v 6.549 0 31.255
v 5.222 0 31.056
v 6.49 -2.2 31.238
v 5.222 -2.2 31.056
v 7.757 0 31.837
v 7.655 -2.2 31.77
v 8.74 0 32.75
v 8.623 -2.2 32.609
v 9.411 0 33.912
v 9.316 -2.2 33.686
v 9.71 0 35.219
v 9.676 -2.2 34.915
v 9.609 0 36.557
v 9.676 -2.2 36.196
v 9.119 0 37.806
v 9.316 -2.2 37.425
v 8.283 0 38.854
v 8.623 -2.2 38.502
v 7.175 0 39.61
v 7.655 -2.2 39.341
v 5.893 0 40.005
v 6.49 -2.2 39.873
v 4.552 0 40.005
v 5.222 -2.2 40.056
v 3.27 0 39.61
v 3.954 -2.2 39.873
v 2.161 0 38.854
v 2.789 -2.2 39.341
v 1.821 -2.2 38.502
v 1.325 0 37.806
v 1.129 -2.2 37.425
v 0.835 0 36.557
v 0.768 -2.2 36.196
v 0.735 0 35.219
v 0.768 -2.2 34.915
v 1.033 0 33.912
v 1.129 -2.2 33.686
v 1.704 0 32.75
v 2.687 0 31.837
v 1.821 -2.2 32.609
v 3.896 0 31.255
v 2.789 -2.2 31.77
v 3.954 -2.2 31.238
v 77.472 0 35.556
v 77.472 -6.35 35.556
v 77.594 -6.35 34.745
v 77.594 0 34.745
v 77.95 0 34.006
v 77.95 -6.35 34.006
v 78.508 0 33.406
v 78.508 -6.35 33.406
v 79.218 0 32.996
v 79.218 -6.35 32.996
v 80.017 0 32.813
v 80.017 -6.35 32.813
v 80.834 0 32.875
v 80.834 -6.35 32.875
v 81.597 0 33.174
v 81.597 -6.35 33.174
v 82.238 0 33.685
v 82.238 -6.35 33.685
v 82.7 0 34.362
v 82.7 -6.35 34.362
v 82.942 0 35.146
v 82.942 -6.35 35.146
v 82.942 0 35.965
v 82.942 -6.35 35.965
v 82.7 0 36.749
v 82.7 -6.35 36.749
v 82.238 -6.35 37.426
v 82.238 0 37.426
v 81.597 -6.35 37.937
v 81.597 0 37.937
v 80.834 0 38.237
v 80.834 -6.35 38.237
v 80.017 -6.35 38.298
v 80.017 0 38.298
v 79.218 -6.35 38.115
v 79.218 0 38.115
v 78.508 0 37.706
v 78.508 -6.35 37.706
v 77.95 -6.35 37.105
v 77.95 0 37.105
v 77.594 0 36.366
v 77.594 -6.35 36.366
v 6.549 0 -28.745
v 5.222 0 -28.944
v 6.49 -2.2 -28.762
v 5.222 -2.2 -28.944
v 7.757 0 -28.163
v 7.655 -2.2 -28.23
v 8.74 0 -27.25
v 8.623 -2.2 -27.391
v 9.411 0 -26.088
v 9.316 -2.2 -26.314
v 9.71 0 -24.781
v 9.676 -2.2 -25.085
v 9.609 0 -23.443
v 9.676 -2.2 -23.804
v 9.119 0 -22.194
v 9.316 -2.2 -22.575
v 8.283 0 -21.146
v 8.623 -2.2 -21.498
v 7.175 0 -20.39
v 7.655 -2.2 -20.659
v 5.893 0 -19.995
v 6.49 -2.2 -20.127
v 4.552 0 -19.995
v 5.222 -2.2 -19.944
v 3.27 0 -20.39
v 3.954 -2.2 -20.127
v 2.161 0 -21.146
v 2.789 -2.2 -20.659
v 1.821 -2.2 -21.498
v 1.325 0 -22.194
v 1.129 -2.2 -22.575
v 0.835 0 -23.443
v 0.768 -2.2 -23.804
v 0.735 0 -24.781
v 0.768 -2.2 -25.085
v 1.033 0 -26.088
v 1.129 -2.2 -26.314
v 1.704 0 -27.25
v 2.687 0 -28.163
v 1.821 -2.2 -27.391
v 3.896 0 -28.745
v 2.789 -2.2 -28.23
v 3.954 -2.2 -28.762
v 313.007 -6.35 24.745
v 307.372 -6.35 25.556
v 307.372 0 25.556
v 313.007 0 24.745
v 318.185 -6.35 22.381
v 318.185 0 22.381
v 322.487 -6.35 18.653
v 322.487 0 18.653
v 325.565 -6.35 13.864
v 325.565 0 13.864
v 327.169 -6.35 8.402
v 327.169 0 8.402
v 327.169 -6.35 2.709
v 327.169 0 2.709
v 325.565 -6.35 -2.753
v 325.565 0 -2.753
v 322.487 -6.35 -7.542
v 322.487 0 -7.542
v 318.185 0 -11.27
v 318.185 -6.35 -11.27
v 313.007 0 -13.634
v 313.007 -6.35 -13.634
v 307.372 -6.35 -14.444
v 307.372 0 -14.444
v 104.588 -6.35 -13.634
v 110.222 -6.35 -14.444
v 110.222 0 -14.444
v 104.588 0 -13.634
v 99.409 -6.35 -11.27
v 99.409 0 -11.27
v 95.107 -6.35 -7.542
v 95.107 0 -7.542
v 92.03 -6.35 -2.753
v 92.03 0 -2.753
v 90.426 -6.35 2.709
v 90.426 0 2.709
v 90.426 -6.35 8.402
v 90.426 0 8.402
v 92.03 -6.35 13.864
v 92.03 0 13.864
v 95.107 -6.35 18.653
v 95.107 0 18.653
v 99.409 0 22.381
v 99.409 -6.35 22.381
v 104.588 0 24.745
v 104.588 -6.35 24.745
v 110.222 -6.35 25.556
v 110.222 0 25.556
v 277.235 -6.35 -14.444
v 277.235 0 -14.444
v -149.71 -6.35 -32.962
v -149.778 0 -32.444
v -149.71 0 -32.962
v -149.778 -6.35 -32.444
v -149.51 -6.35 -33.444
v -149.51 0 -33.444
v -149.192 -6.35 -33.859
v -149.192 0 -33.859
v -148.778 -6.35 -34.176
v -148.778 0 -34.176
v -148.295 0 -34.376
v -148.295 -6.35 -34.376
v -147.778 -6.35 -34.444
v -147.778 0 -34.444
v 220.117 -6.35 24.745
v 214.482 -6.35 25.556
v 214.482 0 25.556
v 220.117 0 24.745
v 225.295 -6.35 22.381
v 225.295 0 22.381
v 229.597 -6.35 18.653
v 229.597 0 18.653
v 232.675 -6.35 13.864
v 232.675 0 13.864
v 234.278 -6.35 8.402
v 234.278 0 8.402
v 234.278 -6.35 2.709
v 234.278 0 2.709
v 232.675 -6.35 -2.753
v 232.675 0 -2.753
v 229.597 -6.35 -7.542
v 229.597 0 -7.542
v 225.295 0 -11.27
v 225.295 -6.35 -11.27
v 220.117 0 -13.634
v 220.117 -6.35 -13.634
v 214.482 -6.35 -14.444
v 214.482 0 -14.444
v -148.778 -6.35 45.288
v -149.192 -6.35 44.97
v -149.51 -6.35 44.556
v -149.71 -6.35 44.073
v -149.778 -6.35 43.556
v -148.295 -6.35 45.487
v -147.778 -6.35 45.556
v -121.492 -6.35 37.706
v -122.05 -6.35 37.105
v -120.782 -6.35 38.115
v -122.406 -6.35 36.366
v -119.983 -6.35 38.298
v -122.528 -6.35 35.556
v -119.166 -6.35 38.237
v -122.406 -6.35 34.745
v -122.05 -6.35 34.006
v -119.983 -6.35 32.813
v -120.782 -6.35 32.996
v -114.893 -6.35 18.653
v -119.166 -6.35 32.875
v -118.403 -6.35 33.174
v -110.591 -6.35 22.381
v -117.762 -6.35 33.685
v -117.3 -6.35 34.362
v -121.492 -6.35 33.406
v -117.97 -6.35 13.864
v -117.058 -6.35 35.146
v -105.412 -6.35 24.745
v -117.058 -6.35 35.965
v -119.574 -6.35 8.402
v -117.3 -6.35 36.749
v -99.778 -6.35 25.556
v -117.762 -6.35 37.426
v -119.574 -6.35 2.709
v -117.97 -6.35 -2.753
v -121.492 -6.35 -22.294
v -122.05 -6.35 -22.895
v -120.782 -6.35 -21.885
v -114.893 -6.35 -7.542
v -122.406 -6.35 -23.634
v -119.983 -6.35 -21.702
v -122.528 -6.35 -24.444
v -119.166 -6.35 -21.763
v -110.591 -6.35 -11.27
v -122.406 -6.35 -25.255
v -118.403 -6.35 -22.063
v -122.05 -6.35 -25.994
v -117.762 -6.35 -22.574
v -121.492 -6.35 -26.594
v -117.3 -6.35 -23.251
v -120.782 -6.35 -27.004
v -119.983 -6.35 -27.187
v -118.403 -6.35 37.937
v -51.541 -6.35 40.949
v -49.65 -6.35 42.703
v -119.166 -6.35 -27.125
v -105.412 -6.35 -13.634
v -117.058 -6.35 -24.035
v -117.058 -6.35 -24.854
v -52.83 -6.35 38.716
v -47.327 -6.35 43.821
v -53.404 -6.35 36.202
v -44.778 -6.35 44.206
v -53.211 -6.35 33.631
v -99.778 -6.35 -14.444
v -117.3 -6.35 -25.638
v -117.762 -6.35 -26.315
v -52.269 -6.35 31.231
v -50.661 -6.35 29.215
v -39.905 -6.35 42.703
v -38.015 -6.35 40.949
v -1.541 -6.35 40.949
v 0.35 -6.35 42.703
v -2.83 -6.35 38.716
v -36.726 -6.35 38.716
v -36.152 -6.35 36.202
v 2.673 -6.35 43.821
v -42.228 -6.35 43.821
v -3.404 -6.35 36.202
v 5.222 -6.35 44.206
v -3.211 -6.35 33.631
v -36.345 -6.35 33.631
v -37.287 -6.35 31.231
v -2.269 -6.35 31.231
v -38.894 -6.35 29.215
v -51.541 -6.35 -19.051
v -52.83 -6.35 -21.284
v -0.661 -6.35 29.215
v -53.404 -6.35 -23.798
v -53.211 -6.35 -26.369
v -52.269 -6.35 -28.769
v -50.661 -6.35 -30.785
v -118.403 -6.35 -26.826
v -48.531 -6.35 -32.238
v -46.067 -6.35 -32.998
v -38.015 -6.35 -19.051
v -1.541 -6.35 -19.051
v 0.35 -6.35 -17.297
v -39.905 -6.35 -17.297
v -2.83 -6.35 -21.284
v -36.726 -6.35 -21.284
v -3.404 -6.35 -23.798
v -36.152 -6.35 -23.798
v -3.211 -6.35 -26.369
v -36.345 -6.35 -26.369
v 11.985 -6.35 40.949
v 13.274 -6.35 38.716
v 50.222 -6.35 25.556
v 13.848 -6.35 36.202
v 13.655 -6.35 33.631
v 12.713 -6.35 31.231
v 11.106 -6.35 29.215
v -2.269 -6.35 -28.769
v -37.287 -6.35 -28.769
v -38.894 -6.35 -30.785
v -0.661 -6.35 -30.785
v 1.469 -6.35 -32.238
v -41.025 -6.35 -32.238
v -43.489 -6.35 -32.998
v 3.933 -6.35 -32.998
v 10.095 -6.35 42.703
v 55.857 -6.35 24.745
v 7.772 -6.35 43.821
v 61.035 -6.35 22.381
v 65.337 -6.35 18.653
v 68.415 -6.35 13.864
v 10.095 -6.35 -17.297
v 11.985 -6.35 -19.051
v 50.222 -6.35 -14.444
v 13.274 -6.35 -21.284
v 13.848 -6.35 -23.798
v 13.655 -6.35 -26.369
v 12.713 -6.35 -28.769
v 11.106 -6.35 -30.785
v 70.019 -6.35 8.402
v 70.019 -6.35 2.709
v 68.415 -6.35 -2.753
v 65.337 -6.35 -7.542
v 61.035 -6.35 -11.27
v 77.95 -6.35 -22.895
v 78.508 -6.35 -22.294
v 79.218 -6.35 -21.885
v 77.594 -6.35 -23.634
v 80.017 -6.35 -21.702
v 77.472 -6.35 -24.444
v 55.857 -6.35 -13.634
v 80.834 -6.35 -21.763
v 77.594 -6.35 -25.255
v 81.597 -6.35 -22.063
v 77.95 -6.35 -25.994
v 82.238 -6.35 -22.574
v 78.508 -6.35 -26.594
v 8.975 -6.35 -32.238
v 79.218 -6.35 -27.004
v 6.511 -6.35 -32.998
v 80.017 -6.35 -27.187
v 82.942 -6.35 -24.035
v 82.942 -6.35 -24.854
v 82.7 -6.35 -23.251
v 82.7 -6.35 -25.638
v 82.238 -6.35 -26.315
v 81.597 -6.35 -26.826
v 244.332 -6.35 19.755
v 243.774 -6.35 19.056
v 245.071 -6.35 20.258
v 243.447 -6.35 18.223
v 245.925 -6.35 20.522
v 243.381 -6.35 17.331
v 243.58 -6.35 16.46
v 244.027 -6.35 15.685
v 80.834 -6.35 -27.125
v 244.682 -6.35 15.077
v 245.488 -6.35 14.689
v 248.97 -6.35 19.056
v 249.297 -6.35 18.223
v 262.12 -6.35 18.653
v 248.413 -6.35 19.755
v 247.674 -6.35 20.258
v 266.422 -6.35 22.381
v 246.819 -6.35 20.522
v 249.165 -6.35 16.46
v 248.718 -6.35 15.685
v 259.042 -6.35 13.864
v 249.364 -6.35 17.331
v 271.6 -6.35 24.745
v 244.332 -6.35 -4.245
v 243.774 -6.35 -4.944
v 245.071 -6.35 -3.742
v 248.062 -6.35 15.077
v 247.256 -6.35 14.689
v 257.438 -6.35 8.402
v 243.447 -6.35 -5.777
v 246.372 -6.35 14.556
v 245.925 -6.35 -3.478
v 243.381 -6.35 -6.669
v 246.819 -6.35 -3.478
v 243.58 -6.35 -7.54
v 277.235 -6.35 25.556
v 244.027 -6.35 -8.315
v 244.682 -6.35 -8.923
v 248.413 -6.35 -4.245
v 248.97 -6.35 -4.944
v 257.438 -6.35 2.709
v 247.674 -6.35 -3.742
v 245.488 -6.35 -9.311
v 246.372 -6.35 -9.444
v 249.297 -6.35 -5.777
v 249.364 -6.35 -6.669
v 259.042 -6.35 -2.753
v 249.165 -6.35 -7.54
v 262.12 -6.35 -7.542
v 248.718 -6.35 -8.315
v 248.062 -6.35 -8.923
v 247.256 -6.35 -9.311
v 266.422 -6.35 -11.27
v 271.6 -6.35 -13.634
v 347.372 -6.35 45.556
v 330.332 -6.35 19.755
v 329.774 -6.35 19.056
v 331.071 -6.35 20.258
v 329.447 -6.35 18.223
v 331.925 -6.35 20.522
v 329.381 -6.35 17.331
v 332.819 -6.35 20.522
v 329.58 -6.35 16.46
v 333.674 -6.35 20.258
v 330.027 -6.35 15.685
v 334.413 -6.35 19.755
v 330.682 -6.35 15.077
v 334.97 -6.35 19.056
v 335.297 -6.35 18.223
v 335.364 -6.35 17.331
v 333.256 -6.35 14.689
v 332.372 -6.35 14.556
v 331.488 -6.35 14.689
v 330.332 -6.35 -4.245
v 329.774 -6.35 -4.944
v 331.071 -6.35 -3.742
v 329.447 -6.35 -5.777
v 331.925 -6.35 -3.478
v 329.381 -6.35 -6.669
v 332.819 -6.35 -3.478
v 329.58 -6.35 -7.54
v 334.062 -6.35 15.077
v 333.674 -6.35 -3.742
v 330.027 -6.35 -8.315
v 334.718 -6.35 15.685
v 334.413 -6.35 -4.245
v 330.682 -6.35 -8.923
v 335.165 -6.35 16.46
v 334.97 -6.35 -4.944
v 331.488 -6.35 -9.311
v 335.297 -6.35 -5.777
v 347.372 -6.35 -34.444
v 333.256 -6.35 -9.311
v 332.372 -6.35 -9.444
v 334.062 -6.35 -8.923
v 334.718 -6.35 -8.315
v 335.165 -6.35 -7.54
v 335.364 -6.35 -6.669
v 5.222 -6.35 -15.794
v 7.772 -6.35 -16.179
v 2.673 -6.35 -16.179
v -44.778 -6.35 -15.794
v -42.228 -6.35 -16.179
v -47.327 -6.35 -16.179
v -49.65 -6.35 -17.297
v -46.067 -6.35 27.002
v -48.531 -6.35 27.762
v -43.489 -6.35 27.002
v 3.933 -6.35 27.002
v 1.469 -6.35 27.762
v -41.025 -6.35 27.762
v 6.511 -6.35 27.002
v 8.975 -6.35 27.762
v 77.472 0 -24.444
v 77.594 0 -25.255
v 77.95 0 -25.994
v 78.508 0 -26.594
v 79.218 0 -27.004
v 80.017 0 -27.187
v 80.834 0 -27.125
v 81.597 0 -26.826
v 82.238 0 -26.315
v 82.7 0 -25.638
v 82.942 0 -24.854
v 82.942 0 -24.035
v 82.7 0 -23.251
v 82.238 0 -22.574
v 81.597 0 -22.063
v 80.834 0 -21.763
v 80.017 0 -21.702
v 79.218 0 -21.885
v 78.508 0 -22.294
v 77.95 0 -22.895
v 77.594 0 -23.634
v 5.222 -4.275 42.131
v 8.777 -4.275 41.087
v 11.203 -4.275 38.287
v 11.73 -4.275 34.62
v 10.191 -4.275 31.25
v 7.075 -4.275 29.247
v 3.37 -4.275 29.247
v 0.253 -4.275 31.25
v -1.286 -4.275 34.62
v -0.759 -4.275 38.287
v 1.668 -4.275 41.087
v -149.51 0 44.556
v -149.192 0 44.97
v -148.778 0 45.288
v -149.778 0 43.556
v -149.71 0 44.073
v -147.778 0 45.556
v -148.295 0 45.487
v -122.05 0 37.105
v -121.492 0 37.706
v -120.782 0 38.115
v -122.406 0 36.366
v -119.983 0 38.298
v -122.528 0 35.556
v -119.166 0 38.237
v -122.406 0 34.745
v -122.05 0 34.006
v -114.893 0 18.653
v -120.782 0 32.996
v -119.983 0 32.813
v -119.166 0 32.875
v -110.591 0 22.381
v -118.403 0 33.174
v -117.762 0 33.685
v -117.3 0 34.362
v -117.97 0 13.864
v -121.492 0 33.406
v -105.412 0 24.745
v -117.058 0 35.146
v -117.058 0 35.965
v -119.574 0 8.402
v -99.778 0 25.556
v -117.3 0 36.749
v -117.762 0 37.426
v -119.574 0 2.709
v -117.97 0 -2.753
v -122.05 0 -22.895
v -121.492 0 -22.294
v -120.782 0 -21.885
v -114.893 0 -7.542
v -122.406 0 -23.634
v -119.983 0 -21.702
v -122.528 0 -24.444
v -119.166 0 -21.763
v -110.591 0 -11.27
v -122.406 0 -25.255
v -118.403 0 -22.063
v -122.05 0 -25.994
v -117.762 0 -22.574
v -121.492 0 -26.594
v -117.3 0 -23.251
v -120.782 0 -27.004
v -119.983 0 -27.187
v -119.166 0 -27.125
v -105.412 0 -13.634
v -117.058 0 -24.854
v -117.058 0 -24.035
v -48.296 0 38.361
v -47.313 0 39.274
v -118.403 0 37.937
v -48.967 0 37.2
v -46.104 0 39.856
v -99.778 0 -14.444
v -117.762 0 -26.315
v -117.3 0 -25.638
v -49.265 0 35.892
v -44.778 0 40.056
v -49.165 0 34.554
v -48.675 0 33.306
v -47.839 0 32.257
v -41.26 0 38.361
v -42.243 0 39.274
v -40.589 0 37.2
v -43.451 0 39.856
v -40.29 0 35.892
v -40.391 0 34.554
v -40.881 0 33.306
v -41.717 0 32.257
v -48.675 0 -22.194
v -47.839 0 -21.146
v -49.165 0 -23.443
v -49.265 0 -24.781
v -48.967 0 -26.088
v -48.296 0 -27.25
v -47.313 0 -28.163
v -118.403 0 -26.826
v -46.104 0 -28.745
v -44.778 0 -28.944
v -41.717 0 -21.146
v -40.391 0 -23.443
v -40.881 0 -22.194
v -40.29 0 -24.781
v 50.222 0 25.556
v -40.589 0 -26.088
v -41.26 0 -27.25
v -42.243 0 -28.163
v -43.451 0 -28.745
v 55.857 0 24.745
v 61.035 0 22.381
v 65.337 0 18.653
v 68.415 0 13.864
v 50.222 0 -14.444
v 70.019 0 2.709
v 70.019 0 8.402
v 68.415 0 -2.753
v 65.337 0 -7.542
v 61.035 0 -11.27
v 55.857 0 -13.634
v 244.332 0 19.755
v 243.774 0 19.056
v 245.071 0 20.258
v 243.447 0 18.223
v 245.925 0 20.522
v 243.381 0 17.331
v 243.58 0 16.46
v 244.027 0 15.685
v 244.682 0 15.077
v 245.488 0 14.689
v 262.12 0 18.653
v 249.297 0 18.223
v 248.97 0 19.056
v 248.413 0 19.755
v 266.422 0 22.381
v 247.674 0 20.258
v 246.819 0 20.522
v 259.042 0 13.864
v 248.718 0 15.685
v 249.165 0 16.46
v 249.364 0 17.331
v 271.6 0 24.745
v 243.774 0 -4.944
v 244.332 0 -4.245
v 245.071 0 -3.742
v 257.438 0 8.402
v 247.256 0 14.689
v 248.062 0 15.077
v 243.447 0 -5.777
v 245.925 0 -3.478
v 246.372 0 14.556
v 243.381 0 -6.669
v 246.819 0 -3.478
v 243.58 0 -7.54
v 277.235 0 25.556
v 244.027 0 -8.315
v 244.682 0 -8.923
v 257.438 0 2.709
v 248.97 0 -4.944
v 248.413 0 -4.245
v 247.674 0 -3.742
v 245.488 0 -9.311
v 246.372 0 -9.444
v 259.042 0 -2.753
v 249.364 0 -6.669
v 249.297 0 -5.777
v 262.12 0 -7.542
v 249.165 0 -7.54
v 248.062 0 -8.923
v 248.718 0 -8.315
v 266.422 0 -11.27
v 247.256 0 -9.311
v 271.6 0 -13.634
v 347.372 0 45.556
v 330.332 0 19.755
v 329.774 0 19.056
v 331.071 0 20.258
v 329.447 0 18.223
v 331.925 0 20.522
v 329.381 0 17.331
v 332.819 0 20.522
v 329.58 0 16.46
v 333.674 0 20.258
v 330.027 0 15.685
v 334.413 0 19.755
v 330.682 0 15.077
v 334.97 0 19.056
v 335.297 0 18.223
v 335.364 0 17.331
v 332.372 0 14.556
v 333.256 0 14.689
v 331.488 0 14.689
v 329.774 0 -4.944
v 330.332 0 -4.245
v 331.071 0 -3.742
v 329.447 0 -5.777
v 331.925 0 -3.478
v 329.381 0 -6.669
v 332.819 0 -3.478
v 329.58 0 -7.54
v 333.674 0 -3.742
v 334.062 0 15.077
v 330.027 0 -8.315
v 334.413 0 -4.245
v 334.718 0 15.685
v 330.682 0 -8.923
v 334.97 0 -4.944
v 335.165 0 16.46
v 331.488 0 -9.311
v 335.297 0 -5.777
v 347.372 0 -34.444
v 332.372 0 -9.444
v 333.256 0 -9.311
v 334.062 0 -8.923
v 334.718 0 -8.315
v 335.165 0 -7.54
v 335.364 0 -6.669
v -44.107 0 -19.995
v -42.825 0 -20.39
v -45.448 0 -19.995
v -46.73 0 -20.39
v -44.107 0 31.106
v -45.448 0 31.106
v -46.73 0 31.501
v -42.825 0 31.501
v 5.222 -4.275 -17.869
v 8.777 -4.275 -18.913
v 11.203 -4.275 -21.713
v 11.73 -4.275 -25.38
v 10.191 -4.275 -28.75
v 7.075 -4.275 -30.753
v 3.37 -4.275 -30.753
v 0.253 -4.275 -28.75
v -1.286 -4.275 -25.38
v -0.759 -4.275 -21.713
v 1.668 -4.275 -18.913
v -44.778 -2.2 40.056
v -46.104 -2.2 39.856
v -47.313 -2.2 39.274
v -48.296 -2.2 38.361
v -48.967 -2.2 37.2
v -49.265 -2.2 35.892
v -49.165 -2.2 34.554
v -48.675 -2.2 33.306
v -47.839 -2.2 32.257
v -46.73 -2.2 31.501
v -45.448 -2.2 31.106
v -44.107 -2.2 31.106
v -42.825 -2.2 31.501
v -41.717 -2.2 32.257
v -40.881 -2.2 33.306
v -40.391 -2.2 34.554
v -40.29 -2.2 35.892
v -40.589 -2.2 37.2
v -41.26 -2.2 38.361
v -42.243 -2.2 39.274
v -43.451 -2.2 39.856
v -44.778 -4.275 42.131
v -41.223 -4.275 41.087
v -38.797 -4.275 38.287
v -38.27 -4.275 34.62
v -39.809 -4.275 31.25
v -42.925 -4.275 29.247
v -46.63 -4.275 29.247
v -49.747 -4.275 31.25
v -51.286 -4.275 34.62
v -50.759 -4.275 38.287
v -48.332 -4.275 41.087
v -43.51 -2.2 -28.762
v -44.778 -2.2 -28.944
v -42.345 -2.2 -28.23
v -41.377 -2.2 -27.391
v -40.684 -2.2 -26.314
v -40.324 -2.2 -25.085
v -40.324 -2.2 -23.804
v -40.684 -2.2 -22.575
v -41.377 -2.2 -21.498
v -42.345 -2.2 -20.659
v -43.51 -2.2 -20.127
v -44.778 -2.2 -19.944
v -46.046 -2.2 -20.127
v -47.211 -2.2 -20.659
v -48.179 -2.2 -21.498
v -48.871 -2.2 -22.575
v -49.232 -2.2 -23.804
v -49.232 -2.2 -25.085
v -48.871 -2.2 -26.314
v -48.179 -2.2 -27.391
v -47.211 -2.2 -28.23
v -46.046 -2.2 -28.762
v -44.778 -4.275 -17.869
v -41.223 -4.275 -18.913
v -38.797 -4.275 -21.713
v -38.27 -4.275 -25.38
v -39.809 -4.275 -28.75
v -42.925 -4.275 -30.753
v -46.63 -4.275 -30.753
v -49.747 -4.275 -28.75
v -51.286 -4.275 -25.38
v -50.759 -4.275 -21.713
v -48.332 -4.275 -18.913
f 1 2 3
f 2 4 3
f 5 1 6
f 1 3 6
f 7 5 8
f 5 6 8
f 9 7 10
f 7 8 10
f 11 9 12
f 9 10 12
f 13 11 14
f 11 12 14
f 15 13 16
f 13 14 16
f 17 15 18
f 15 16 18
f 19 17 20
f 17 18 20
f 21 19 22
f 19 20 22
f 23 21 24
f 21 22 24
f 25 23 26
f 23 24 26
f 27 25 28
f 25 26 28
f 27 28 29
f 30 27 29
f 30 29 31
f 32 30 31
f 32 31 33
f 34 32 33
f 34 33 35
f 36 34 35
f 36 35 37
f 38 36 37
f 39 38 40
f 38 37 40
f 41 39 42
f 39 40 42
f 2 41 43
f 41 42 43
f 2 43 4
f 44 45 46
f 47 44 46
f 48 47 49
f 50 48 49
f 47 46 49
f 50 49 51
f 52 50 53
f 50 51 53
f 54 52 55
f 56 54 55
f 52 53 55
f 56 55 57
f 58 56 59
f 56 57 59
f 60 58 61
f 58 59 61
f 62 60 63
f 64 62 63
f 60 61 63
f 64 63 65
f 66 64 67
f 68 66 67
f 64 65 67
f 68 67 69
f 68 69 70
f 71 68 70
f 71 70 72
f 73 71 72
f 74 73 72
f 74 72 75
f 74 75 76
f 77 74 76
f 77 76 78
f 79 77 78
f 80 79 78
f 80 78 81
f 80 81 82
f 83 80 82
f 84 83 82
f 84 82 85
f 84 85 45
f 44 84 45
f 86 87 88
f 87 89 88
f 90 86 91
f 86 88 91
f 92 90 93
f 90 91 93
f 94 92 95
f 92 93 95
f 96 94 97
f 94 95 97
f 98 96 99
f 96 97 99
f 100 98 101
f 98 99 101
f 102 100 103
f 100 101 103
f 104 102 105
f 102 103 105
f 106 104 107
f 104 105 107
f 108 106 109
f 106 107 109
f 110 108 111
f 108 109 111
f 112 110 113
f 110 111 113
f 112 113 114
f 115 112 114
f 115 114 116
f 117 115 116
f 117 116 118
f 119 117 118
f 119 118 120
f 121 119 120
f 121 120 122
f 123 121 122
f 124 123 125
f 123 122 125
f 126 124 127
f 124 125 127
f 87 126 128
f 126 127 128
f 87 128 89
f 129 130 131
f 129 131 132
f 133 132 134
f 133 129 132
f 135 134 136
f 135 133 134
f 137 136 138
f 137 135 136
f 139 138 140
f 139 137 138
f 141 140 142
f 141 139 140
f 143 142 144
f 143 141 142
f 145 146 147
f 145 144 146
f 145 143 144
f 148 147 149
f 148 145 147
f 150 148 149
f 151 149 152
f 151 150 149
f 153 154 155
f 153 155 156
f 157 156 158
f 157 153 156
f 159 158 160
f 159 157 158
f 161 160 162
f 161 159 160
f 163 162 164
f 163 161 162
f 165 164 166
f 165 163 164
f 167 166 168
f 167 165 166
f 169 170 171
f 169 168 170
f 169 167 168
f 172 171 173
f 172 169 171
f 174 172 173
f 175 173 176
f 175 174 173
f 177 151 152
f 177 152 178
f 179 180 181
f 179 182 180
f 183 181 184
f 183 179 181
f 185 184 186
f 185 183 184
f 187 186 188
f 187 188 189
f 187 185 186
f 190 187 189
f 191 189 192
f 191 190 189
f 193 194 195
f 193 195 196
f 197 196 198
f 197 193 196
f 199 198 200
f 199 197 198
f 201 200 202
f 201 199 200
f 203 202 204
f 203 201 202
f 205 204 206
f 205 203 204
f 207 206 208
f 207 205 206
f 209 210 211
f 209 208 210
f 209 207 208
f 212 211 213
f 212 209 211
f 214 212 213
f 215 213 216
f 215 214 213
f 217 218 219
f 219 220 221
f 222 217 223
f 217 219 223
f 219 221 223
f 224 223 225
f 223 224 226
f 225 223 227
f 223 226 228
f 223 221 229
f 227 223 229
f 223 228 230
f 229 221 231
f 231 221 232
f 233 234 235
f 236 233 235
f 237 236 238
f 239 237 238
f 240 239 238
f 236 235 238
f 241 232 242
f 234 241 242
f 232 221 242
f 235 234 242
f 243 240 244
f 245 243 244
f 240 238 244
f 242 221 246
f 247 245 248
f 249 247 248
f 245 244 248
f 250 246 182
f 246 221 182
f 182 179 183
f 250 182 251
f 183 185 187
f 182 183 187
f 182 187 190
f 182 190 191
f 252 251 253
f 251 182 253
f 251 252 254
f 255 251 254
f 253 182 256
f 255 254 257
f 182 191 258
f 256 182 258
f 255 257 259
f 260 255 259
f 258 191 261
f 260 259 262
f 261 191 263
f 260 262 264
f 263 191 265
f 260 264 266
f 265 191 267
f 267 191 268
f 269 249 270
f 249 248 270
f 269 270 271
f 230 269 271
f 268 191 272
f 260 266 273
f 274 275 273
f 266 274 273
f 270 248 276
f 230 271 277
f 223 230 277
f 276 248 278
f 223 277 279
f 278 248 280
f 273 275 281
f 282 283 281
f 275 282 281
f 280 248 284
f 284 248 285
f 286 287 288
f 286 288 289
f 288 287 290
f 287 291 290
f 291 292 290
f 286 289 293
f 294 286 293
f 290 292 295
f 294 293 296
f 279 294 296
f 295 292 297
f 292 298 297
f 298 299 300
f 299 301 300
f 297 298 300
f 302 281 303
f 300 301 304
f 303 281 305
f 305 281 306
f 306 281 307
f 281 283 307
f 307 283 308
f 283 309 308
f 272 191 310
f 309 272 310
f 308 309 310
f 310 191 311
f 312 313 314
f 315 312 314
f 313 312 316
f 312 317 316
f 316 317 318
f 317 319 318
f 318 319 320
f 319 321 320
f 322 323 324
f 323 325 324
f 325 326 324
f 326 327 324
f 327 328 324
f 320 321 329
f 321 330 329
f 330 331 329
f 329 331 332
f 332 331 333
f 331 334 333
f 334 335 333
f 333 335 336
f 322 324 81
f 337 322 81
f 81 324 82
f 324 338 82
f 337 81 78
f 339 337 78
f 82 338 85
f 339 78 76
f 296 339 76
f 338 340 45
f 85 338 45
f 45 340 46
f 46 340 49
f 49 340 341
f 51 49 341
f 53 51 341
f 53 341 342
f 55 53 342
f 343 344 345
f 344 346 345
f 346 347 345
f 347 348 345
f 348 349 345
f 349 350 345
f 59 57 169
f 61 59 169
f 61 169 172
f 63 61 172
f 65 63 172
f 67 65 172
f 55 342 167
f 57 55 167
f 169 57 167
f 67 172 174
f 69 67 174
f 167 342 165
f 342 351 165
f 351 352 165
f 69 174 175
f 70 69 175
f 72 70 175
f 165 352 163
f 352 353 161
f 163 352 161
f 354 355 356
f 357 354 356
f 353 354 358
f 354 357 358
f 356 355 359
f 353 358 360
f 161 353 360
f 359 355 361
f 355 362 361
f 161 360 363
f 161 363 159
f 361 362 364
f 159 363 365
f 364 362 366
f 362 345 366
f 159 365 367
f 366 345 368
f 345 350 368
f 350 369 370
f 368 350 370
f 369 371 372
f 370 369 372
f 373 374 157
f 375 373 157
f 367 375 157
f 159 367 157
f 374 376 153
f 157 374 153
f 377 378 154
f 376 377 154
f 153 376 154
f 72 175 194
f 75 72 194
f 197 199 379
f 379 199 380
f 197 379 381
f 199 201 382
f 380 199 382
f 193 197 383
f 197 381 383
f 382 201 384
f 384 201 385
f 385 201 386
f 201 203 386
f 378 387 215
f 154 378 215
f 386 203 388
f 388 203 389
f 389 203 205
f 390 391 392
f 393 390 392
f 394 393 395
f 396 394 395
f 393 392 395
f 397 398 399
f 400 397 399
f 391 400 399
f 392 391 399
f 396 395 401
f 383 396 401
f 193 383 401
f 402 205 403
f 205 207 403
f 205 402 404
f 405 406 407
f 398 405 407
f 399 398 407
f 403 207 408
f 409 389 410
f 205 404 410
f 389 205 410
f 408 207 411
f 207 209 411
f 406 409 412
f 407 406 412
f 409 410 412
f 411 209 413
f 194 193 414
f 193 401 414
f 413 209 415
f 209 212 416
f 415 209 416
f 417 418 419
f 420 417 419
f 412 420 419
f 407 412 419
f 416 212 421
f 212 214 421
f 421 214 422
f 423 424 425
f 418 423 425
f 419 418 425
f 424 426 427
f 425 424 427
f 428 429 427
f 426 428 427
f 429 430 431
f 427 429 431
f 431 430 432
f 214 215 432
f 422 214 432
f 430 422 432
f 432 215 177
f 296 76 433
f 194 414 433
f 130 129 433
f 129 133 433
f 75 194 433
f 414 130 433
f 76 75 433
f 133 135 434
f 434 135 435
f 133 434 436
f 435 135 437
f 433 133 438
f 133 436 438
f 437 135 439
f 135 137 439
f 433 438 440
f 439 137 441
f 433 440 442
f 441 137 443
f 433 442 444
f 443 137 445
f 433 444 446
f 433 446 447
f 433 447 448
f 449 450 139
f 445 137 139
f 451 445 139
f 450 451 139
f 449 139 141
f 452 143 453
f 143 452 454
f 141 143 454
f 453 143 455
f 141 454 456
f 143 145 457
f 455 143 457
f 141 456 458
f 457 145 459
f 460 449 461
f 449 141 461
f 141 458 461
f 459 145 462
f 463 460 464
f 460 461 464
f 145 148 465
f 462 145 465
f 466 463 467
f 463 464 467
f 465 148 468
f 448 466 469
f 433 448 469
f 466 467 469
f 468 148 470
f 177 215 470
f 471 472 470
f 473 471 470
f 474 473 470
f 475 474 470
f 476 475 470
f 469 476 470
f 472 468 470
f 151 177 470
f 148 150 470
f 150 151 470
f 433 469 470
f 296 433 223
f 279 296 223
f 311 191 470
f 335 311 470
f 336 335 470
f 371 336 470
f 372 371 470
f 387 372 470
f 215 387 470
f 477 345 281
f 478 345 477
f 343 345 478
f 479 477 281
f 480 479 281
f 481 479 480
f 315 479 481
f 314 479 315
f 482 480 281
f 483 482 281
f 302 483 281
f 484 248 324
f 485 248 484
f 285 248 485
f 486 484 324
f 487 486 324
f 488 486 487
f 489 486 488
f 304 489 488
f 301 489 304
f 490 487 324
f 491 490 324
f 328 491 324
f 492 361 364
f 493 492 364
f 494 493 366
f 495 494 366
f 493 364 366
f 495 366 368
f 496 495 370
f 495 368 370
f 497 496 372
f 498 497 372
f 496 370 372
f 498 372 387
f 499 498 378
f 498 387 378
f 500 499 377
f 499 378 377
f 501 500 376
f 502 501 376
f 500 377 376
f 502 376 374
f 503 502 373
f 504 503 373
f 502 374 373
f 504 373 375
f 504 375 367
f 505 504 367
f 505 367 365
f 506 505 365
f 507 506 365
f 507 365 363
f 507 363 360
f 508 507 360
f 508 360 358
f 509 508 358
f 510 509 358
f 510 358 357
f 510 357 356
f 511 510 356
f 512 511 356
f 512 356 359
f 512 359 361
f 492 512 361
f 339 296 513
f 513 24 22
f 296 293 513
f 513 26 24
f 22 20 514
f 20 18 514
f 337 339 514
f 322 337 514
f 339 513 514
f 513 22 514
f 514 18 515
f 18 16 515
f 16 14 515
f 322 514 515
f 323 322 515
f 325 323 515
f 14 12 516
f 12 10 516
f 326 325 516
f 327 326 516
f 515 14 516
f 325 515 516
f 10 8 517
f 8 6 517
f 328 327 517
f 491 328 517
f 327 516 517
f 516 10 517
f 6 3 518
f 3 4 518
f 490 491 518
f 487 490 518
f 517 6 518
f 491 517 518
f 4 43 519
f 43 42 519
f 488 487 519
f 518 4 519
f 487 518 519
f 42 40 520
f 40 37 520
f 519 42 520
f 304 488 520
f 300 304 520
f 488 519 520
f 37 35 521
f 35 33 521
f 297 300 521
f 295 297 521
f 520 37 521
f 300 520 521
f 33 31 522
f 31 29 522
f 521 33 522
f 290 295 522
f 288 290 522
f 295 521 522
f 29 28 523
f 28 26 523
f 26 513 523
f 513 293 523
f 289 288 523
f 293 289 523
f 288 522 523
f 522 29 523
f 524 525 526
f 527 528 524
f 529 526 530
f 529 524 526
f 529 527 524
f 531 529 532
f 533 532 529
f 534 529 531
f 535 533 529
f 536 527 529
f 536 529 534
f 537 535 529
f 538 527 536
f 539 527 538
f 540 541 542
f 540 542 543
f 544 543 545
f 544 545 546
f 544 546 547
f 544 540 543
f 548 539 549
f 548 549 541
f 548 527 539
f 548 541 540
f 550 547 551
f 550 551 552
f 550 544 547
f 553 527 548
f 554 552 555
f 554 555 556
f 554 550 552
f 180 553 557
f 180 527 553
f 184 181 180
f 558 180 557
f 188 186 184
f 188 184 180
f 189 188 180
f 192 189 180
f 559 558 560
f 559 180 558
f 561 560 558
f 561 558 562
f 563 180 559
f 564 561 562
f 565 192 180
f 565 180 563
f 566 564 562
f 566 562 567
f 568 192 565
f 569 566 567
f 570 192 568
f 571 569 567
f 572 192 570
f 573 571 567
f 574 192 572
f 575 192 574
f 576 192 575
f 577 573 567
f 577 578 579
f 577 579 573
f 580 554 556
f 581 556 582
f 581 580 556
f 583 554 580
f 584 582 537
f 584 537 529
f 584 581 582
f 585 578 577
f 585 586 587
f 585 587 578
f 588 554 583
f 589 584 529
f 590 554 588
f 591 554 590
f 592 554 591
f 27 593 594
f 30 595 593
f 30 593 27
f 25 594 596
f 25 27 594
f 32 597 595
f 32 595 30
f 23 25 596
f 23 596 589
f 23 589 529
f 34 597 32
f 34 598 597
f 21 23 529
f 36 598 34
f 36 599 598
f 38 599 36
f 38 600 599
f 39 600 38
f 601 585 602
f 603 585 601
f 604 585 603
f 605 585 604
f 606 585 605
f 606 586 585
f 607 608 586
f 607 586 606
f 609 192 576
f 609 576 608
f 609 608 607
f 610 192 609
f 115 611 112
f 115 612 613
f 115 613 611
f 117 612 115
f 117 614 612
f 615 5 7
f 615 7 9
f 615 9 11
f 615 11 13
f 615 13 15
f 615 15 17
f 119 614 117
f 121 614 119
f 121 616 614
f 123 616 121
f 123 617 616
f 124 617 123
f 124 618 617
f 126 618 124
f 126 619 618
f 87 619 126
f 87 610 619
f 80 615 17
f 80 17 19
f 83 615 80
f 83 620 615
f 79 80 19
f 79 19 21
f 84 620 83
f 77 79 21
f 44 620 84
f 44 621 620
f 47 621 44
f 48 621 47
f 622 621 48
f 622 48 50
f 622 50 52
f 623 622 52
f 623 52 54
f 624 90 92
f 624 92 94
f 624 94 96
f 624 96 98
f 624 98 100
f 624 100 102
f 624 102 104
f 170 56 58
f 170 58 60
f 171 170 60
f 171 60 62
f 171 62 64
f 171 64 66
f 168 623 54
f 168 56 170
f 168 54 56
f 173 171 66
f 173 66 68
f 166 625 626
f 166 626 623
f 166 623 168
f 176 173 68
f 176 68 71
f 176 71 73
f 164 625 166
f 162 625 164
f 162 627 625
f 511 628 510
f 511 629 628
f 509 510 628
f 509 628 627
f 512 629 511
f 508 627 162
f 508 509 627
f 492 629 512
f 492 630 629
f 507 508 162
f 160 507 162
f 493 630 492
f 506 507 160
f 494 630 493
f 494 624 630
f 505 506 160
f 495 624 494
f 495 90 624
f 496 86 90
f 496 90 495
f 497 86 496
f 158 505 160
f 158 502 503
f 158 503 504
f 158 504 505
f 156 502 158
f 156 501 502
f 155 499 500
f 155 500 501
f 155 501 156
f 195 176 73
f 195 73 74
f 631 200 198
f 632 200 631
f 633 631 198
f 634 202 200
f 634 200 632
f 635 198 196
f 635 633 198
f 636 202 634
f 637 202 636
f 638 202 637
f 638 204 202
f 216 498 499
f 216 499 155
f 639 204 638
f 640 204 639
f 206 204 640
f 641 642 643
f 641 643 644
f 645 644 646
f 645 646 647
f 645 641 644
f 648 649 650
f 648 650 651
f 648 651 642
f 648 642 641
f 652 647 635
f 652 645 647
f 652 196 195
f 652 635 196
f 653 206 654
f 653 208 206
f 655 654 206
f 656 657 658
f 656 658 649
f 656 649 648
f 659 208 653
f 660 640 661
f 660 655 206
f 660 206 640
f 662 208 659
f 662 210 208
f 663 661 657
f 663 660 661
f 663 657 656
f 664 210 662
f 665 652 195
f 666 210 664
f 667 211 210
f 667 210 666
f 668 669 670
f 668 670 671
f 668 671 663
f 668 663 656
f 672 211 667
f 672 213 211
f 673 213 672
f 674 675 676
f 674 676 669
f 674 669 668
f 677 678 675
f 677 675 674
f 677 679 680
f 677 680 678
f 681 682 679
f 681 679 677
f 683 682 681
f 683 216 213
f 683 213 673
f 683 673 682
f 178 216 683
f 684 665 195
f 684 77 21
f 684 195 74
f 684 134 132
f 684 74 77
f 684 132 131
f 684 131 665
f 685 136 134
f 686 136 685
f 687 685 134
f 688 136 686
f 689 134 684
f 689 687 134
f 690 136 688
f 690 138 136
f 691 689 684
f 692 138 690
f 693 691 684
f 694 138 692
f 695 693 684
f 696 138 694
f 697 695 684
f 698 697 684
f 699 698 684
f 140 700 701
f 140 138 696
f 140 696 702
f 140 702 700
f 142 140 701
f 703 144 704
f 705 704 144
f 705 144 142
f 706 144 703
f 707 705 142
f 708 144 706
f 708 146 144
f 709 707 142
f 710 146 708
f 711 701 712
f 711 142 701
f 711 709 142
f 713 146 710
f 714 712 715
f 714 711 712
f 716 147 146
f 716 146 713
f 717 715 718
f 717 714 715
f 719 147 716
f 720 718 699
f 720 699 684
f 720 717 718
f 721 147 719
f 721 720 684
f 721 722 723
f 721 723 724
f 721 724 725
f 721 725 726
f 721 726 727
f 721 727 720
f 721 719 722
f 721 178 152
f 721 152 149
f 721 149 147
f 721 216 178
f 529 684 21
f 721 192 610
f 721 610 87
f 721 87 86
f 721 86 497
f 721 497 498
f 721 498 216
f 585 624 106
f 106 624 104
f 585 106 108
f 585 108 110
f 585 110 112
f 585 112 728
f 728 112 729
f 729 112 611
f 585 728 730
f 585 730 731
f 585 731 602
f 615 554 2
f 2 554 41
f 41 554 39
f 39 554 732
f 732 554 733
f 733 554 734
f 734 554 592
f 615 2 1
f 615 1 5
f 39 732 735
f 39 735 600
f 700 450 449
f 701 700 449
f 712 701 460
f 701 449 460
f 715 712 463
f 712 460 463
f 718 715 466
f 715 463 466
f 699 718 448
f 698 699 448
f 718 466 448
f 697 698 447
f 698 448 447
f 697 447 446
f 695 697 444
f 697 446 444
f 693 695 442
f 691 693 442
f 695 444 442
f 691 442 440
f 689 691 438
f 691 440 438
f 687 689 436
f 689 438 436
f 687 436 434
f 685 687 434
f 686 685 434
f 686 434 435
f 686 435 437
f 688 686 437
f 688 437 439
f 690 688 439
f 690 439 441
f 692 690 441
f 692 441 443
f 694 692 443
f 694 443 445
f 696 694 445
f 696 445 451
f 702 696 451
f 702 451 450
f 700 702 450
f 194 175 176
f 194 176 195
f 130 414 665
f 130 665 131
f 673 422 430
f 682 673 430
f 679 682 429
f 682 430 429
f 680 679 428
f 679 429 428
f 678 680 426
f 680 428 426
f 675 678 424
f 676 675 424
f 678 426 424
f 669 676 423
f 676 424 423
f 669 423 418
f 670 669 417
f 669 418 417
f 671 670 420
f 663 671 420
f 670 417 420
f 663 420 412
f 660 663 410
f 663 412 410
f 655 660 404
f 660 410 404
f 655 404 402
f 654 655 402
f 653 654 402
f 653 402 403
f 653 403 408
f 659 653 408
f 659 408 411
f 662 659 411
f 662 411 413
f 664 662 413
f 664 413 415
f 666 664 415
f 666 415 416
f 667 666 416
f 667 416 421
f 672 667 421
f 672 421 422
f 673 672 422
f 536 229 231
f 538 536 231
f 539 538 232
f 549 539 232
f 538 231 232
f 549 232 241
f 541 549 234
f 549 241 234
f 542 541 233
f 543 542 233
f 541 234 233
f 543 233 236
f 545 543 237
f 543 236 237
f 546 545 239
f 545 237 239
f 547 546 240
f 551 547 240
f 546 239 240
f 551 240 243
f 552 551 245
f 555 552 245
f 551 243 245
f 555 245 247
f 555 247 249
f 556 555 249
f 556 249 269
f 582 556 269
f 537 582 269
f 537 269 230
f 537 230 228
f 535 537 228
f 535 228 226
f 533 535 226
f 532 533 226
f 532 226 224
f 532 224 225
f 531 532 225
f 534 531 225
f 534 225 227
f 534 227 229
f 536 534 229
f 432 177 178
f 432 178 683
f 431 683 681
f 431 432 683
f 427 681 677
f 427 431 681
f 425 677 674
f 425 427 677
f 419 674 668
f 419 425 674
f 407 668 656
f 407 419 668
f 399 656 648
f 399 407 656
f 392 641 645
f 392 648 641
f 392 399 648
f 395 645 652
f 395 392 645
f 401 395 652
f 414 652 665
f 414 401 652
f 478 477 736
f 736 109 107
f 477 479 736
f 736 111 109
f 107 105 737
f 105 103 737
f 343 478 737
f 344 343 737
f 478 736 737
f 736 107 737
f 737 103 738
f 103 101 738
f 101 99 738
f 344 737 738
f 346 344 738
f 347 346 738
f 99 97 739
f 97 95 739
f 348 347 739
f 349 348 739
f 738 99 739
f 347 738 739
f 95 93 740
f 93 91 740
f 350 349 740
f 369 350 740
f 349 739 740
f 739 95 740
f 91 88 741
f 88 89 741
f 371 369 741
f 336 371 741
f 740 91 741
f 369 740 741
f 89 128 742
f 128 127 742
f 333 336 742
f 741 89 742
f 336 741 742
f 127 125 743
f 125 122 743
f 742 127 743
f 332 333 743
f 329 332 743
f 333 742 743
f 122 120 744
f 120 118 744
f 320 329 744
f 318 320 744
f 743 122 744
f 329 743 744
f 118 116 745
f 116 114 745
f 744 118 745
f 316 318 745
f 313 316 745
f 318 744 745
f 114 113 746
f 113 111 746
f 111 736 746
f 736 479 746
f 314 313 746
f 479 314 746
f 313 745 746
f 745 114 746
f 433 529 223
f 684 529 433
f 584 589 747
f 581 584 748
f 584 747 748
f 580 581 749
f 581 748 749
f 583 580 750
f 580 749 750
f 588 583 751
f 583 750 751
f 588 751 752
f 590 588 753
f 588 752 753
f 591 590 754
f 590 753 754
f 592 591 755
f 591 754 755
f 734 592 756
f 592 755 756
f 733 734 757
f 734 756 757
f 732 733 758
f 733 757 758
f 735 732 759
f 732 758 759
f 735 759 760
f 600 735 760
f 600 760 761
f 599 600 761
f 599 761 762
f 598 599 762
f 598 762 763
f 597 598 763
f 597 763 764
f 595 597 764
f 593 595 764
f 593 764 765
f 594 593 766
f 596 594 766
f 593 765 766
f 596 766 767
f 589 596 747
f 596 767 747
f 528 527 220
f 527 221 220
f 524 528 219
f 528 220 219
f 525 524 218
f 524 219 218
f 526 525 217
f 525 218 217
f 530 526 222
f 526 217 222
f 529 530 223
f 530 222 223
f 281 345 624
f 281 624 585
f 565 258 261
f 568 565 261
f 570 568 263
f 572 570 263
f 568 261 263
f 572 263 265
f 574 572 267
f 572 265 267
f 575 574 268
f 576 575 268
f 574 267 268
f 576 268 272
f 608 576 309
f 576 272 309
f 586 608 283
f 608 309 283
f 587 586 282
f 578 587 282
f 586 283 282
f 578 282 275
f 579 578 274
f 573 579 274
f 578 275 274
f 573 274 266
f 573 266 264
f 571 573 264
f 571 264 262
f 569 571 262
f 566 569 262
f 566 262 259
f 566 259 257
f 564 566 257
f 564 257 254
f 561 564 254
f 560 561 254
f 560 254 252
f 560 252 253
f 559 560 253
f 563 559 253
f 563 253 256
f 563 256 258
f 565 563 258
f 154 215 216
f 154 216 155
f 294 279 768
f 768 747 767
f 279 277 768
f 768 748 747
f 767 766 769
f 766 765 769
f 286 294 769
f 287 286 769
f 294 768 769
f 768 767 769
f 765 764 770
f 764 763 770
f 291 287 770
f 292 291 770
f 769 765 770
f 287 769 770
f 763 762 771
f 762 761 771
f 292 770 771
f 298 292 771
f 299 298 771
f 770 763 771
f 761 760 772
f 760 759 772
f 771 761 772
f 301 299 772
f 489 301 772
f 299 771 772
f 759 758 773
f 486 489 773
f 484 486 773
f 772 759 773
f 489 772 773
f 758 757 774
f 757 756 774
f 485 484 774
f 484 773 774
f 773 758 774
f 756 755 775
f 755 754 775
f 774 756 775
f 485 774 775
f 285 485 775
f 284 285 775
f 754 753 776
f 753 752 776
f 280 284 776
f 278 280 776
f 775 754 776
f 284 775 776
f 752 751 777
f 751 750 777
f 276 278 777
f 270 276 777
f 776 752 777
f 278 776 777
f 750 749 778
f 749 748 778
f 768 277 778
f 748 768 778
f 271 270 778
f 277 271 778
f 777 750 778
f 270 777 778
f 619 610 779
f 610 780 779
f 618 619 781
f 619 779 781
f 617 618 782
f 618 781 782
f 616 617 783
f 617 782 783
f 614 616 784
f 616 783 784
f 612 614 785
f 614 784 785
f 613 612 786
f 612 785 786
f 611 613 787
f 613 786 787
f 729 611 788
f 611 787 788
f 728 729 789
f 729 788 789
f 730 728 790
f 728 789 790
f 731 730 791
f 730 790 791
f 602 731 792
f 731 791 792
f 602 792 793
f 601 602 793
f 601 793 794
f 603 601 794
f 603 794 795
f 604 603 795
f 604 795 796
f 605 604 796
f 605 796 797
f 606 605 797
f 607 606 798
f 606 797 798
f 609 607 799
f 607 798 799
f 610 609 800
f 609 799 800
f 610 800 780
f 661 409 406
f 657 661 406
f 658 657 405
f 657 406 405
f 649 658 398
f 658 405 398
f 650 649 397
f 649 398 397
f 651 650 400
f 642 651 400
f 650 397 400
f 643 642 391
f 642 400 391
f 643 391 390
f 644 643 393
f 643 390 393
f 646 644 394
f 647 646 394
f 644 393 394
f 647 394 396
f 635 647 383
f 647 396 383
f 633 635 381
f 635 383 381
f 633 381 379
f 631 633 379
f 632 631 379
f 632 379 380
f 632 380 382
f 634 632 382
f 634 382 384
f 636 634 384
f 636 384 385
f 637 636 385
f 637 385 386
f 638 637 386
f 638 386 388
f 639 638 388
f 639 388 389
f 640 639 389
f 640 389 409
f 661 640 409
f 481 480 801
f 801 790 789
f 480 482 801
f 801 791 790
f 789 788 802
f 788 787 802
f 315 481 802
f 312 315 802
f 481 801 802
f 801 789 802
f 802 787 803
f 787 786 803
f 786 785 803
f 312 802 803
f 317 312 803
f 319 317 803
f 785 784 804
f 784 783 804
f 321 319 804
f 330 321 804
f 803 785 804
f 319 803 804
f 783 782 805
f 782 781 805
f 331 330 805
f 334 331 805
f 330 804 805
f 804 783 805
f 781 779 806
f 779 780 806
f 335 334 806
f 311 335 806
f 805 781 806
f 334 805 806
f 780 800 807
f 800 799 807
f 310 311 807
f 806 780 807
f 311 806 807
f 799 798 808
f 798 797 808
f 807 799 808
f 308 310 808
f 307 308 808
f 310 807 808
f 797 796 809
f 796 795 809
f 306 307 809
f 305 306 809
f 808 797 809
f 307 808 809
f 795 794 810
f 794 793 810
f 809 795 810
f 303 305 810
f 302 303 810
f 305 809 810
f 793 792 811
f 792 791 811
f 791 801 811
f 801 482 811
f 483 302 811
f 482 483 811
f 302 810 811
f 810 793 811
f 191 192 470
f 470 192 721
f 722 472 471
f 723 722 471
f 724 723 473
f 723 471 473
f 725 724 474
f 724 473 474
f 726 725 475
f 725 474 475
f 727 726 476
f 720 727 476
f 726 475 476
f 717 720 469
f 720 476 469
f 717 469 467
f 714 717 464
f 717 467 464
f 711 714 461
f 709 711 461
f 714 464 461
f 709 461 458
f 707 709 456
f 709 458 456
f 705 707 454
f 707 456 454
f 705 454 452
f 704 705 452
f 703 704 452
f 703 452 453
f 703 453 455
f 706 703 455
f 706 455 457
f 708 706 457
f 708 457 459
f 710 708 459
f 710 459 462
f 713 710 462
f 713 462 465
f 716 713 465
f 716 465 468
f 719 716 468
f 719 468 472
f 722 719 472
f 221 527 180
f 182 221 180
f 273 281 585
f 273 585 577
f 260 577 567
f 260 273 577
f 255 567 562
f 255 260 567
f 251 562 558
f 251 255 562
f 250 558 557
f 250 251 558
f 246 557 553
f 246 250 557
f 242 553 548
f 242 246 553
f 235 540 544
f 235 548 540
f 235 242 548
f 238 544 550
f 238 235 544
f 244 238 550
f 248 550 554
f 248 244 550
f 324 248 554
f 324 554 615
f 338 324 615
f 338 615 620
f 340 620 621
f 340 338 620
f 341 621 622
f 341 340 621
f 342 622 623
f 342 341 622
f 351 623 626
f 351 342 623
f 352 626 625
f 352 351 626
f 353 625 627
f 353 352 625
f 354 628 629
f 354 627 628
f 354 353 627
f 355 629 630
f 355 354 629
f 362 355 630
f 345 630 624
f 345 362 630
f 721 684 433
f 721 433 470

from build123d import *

# Parameters (mm, degrees)
CROQUIS1_W                                      = 497.15
CROQUIS1_H                                      = 80
BRIDA_BASE1_DEPTH                               = 6.35
REDONDEO1_R                                     = 2
TALADRO_DE_MARGEN_PARA_M51_D                    = 5.5
CORTAR_EXTRUIR1_DEPTH                           = 10
CROQUIS10_R                                     = 3
CORTAR_EXTRUIR2_DEPTH                           = 10
SKETCH1_R                                       = 4.5
CUT_EXTRUDE1_DEPTH                              = 6.35
CSK_FOR_M8_OVAL_HEAD_MACHINE_SCREW1_D           = 9
CSK_FOR_M8_OVAL_HEAD_MACHINE_SCREW1_DEPTH       = 6.349
CSK_FOR_M8_OVAL_HEAD_MACHINE_SCREW1_CSINK_D     = 17.3
CSK_FOR_M8_OVAL_HEAD_MACHINE_SCREW1_CSINK_ANGLE = 90
CSK_FOR_M8_OVAL_HEAD_MACHINE_SCREW1_TIP         = 2.703872786


# Sheet-metal steps are written as plain solids
with BuildPart() as part:
    # Croquis1 → Brida base1 (new body)
    with BuildSketch(Plane(origin=(0, 0, 0), x_dir=(1, 0, 0), z_dir=(0, 1, 0))):
        with Locations((98.797222222, -5.555555556)):
            Rectangle(CROQUIS1_W, CROQUIS1_H)
    extrude(amount=-BRIDA_BASE1_DEPTH)

    # Redondeo1
    redondeo1_edges = [part.edges().sort_by_distance(p)[0] for p in [
        (-149.777777778, -3.175, -34.444444444),
        (-149.777777778, -3.175, 45.555555556),
    ]]
    fillet(redondeo1_edges, radius=REDONDEO1_R)

    # Taladro de margen para M51 (through all)
    with Locations(Plane(origin=(0, 0, 0), x_dir=(1, 0, 0), z_dir=(0, 1, 0))):
        with Locations((-119.777777778, 24.444444444), (-119.777777778, -35.555555556), (80.222222222, -35.555555556), (80.222222222, 24.444444444)):
            Hole(TALADRO_DE_MARGEN_PARA_M51_D / 2)

    # Croquis9 → Cortar-Extruir1 (cut)
    with BuildSketch(Plane(origin=(0, -6.35, 0), x_dir=(-1, 0, 0), z_dir=(0, -1, 0))):
        with BuildLine():
            Line((-307.372222222, 14.444444444), (-277.234752083, 14.444444444))
            ThreePointArc((-277.234752083, 14.444444444), (-257.234752083, -5.555555556), (-277.234752083, -25.555555556))
            Line((-277.234752083, -25.555555556), (-307.372222222, -25.555555556))
            ThreePointArc((-307.372222222, -25.555555556), (-327.372222222, -5.555555556), (-307.372222222, 14.444444444))
        make_face()
        with BuildLine():
            Line((-50.222222222, 14.444444444), (99.777777778, 14.444444444))
            ThreePointArc((99.777777778, 14.444444444), (119.777777778, -5.555555556), (99.777777778, -25.555555556))
            Line((99.777777778, -25.555555556), (-50.222222222, -25.555555556))
            ThreePointArc((-50.222222222, -25.555555556), (-70.222222222, -5.555555556), (-50.222222222, 14.444444444))
        make_face()
        with BuildLine():
            Line((-214.481912447, 14.444444444), (-110.222222222, 14.444444444))
            ThreePointArc((-110.222222222, 14.444444444), (-90.222222222, -5.555555556), (-110.222222222, -25.555555556))
            Line((-110.222222222, -25.555555556), (-214.481912447, -25.555555556))
            ThreePointArc((-214.481912447, -25.555555556), (-234.481912447, -5.555555556), (-214.481912447, 14.444444444))
        make_face()
    extrude(amount=-CORTAR_EXTRUIR1_DEPTH, mode=Mode.SUBTRACT)

    # Croquis10 → Cortar-Extruir2 (cut)
    with BuildSketch(Plane.XZ.offset(6.35)):
        with Locations(Location((332.372222222, 17.555555556, 0), (0, 0, 270))):
            Circle(CROQUIS10_R)
        with Locations(Location((246.372222222, 17.555555556, 0), (0, 0, 270))):
            Circle(CROQUIS10_R)
        with Locations(Location((246.372222222, -6.444444444, 0), (0, 0, 270))):
            Circle(CROQUIS10_R)
        with Locations(Location((332.372222222, -6.444444444, 0), (0, 0, 270))):
            Circle(CROQUIS10_R)
    extrude(amount=-CORTAR_EXTRUIR2_DEPTH, mode=Mode.SUBTRACT)

    # Sketch1 → Cut-Extrude1 (cut)
    with BuildSketch(Plane.XZ.offset(6.35)):
        with Locations(Location((-44.777777778, -24.444444444, 0), (0, 0, 270))):
            Circle(SKETCH1_R)
        with Locations(Location((5.222222222, -24.444444444, 0), (0, 0, 270))):
            Circle(SKETCH1_R)
        with Locations(Location((5.222222222, 35.555555556, 0), (0, 0, 270))):
            Circle(SKETCH1_R)
        with Locations(Location((-44.777777778, 35.555555556, 0), (0, 0, 90))):
            Circle(SKETCH1_R)
    extrude(amount=-CUT_EXTRUDE1_DEPTH, mode=Mode.SUBTRACT)

    # CSK for M8 Oval Head Machine Screw1
    with Locations(Plane(origin=(5.222222222, -6.35, 35.555555556), x_dir=(0, 0, -1), z_dir=(0, -1, 0))):
        with Locations((0, 0), (0, -50), (60, -50), (60, 0)):
            CounterSinkHole(CSK_FOR_M8_OVAL_HEAD_MACHINE_SCREW1_D / 2, CSK_FOR_M8_OVAL_HEAD_MACHINE_SCREW1_CSINK_D / 2, depth=CSK_FOR_M8_OVAL_HEAD_MACHINE_SCREW1_DEPTH, counter_sink_angle=CSK_FOR_M8_OVAL_HEAD_MACHINE_SCREW1_CSINK_ANGLE)
            with Locations((0, 0, -(CSK_FOR_M8_OVAL_HEAD_MACHINE_SCREW1_DEPTH + CSK_FOR_M8_OVAL_HEAD_MACHINE_SCREW1_TIP / 2))):  # 118° drill point
                Cone(0, CSK_FOR_M8_OVAL_HEAD_MACHINE_SCREW1_D / 2, CSK_FOR_M8_OVAL_HEAD_MACHINE_SCREW1_TIP, mode=Mode.SUBTRACT)


solid = part.part
